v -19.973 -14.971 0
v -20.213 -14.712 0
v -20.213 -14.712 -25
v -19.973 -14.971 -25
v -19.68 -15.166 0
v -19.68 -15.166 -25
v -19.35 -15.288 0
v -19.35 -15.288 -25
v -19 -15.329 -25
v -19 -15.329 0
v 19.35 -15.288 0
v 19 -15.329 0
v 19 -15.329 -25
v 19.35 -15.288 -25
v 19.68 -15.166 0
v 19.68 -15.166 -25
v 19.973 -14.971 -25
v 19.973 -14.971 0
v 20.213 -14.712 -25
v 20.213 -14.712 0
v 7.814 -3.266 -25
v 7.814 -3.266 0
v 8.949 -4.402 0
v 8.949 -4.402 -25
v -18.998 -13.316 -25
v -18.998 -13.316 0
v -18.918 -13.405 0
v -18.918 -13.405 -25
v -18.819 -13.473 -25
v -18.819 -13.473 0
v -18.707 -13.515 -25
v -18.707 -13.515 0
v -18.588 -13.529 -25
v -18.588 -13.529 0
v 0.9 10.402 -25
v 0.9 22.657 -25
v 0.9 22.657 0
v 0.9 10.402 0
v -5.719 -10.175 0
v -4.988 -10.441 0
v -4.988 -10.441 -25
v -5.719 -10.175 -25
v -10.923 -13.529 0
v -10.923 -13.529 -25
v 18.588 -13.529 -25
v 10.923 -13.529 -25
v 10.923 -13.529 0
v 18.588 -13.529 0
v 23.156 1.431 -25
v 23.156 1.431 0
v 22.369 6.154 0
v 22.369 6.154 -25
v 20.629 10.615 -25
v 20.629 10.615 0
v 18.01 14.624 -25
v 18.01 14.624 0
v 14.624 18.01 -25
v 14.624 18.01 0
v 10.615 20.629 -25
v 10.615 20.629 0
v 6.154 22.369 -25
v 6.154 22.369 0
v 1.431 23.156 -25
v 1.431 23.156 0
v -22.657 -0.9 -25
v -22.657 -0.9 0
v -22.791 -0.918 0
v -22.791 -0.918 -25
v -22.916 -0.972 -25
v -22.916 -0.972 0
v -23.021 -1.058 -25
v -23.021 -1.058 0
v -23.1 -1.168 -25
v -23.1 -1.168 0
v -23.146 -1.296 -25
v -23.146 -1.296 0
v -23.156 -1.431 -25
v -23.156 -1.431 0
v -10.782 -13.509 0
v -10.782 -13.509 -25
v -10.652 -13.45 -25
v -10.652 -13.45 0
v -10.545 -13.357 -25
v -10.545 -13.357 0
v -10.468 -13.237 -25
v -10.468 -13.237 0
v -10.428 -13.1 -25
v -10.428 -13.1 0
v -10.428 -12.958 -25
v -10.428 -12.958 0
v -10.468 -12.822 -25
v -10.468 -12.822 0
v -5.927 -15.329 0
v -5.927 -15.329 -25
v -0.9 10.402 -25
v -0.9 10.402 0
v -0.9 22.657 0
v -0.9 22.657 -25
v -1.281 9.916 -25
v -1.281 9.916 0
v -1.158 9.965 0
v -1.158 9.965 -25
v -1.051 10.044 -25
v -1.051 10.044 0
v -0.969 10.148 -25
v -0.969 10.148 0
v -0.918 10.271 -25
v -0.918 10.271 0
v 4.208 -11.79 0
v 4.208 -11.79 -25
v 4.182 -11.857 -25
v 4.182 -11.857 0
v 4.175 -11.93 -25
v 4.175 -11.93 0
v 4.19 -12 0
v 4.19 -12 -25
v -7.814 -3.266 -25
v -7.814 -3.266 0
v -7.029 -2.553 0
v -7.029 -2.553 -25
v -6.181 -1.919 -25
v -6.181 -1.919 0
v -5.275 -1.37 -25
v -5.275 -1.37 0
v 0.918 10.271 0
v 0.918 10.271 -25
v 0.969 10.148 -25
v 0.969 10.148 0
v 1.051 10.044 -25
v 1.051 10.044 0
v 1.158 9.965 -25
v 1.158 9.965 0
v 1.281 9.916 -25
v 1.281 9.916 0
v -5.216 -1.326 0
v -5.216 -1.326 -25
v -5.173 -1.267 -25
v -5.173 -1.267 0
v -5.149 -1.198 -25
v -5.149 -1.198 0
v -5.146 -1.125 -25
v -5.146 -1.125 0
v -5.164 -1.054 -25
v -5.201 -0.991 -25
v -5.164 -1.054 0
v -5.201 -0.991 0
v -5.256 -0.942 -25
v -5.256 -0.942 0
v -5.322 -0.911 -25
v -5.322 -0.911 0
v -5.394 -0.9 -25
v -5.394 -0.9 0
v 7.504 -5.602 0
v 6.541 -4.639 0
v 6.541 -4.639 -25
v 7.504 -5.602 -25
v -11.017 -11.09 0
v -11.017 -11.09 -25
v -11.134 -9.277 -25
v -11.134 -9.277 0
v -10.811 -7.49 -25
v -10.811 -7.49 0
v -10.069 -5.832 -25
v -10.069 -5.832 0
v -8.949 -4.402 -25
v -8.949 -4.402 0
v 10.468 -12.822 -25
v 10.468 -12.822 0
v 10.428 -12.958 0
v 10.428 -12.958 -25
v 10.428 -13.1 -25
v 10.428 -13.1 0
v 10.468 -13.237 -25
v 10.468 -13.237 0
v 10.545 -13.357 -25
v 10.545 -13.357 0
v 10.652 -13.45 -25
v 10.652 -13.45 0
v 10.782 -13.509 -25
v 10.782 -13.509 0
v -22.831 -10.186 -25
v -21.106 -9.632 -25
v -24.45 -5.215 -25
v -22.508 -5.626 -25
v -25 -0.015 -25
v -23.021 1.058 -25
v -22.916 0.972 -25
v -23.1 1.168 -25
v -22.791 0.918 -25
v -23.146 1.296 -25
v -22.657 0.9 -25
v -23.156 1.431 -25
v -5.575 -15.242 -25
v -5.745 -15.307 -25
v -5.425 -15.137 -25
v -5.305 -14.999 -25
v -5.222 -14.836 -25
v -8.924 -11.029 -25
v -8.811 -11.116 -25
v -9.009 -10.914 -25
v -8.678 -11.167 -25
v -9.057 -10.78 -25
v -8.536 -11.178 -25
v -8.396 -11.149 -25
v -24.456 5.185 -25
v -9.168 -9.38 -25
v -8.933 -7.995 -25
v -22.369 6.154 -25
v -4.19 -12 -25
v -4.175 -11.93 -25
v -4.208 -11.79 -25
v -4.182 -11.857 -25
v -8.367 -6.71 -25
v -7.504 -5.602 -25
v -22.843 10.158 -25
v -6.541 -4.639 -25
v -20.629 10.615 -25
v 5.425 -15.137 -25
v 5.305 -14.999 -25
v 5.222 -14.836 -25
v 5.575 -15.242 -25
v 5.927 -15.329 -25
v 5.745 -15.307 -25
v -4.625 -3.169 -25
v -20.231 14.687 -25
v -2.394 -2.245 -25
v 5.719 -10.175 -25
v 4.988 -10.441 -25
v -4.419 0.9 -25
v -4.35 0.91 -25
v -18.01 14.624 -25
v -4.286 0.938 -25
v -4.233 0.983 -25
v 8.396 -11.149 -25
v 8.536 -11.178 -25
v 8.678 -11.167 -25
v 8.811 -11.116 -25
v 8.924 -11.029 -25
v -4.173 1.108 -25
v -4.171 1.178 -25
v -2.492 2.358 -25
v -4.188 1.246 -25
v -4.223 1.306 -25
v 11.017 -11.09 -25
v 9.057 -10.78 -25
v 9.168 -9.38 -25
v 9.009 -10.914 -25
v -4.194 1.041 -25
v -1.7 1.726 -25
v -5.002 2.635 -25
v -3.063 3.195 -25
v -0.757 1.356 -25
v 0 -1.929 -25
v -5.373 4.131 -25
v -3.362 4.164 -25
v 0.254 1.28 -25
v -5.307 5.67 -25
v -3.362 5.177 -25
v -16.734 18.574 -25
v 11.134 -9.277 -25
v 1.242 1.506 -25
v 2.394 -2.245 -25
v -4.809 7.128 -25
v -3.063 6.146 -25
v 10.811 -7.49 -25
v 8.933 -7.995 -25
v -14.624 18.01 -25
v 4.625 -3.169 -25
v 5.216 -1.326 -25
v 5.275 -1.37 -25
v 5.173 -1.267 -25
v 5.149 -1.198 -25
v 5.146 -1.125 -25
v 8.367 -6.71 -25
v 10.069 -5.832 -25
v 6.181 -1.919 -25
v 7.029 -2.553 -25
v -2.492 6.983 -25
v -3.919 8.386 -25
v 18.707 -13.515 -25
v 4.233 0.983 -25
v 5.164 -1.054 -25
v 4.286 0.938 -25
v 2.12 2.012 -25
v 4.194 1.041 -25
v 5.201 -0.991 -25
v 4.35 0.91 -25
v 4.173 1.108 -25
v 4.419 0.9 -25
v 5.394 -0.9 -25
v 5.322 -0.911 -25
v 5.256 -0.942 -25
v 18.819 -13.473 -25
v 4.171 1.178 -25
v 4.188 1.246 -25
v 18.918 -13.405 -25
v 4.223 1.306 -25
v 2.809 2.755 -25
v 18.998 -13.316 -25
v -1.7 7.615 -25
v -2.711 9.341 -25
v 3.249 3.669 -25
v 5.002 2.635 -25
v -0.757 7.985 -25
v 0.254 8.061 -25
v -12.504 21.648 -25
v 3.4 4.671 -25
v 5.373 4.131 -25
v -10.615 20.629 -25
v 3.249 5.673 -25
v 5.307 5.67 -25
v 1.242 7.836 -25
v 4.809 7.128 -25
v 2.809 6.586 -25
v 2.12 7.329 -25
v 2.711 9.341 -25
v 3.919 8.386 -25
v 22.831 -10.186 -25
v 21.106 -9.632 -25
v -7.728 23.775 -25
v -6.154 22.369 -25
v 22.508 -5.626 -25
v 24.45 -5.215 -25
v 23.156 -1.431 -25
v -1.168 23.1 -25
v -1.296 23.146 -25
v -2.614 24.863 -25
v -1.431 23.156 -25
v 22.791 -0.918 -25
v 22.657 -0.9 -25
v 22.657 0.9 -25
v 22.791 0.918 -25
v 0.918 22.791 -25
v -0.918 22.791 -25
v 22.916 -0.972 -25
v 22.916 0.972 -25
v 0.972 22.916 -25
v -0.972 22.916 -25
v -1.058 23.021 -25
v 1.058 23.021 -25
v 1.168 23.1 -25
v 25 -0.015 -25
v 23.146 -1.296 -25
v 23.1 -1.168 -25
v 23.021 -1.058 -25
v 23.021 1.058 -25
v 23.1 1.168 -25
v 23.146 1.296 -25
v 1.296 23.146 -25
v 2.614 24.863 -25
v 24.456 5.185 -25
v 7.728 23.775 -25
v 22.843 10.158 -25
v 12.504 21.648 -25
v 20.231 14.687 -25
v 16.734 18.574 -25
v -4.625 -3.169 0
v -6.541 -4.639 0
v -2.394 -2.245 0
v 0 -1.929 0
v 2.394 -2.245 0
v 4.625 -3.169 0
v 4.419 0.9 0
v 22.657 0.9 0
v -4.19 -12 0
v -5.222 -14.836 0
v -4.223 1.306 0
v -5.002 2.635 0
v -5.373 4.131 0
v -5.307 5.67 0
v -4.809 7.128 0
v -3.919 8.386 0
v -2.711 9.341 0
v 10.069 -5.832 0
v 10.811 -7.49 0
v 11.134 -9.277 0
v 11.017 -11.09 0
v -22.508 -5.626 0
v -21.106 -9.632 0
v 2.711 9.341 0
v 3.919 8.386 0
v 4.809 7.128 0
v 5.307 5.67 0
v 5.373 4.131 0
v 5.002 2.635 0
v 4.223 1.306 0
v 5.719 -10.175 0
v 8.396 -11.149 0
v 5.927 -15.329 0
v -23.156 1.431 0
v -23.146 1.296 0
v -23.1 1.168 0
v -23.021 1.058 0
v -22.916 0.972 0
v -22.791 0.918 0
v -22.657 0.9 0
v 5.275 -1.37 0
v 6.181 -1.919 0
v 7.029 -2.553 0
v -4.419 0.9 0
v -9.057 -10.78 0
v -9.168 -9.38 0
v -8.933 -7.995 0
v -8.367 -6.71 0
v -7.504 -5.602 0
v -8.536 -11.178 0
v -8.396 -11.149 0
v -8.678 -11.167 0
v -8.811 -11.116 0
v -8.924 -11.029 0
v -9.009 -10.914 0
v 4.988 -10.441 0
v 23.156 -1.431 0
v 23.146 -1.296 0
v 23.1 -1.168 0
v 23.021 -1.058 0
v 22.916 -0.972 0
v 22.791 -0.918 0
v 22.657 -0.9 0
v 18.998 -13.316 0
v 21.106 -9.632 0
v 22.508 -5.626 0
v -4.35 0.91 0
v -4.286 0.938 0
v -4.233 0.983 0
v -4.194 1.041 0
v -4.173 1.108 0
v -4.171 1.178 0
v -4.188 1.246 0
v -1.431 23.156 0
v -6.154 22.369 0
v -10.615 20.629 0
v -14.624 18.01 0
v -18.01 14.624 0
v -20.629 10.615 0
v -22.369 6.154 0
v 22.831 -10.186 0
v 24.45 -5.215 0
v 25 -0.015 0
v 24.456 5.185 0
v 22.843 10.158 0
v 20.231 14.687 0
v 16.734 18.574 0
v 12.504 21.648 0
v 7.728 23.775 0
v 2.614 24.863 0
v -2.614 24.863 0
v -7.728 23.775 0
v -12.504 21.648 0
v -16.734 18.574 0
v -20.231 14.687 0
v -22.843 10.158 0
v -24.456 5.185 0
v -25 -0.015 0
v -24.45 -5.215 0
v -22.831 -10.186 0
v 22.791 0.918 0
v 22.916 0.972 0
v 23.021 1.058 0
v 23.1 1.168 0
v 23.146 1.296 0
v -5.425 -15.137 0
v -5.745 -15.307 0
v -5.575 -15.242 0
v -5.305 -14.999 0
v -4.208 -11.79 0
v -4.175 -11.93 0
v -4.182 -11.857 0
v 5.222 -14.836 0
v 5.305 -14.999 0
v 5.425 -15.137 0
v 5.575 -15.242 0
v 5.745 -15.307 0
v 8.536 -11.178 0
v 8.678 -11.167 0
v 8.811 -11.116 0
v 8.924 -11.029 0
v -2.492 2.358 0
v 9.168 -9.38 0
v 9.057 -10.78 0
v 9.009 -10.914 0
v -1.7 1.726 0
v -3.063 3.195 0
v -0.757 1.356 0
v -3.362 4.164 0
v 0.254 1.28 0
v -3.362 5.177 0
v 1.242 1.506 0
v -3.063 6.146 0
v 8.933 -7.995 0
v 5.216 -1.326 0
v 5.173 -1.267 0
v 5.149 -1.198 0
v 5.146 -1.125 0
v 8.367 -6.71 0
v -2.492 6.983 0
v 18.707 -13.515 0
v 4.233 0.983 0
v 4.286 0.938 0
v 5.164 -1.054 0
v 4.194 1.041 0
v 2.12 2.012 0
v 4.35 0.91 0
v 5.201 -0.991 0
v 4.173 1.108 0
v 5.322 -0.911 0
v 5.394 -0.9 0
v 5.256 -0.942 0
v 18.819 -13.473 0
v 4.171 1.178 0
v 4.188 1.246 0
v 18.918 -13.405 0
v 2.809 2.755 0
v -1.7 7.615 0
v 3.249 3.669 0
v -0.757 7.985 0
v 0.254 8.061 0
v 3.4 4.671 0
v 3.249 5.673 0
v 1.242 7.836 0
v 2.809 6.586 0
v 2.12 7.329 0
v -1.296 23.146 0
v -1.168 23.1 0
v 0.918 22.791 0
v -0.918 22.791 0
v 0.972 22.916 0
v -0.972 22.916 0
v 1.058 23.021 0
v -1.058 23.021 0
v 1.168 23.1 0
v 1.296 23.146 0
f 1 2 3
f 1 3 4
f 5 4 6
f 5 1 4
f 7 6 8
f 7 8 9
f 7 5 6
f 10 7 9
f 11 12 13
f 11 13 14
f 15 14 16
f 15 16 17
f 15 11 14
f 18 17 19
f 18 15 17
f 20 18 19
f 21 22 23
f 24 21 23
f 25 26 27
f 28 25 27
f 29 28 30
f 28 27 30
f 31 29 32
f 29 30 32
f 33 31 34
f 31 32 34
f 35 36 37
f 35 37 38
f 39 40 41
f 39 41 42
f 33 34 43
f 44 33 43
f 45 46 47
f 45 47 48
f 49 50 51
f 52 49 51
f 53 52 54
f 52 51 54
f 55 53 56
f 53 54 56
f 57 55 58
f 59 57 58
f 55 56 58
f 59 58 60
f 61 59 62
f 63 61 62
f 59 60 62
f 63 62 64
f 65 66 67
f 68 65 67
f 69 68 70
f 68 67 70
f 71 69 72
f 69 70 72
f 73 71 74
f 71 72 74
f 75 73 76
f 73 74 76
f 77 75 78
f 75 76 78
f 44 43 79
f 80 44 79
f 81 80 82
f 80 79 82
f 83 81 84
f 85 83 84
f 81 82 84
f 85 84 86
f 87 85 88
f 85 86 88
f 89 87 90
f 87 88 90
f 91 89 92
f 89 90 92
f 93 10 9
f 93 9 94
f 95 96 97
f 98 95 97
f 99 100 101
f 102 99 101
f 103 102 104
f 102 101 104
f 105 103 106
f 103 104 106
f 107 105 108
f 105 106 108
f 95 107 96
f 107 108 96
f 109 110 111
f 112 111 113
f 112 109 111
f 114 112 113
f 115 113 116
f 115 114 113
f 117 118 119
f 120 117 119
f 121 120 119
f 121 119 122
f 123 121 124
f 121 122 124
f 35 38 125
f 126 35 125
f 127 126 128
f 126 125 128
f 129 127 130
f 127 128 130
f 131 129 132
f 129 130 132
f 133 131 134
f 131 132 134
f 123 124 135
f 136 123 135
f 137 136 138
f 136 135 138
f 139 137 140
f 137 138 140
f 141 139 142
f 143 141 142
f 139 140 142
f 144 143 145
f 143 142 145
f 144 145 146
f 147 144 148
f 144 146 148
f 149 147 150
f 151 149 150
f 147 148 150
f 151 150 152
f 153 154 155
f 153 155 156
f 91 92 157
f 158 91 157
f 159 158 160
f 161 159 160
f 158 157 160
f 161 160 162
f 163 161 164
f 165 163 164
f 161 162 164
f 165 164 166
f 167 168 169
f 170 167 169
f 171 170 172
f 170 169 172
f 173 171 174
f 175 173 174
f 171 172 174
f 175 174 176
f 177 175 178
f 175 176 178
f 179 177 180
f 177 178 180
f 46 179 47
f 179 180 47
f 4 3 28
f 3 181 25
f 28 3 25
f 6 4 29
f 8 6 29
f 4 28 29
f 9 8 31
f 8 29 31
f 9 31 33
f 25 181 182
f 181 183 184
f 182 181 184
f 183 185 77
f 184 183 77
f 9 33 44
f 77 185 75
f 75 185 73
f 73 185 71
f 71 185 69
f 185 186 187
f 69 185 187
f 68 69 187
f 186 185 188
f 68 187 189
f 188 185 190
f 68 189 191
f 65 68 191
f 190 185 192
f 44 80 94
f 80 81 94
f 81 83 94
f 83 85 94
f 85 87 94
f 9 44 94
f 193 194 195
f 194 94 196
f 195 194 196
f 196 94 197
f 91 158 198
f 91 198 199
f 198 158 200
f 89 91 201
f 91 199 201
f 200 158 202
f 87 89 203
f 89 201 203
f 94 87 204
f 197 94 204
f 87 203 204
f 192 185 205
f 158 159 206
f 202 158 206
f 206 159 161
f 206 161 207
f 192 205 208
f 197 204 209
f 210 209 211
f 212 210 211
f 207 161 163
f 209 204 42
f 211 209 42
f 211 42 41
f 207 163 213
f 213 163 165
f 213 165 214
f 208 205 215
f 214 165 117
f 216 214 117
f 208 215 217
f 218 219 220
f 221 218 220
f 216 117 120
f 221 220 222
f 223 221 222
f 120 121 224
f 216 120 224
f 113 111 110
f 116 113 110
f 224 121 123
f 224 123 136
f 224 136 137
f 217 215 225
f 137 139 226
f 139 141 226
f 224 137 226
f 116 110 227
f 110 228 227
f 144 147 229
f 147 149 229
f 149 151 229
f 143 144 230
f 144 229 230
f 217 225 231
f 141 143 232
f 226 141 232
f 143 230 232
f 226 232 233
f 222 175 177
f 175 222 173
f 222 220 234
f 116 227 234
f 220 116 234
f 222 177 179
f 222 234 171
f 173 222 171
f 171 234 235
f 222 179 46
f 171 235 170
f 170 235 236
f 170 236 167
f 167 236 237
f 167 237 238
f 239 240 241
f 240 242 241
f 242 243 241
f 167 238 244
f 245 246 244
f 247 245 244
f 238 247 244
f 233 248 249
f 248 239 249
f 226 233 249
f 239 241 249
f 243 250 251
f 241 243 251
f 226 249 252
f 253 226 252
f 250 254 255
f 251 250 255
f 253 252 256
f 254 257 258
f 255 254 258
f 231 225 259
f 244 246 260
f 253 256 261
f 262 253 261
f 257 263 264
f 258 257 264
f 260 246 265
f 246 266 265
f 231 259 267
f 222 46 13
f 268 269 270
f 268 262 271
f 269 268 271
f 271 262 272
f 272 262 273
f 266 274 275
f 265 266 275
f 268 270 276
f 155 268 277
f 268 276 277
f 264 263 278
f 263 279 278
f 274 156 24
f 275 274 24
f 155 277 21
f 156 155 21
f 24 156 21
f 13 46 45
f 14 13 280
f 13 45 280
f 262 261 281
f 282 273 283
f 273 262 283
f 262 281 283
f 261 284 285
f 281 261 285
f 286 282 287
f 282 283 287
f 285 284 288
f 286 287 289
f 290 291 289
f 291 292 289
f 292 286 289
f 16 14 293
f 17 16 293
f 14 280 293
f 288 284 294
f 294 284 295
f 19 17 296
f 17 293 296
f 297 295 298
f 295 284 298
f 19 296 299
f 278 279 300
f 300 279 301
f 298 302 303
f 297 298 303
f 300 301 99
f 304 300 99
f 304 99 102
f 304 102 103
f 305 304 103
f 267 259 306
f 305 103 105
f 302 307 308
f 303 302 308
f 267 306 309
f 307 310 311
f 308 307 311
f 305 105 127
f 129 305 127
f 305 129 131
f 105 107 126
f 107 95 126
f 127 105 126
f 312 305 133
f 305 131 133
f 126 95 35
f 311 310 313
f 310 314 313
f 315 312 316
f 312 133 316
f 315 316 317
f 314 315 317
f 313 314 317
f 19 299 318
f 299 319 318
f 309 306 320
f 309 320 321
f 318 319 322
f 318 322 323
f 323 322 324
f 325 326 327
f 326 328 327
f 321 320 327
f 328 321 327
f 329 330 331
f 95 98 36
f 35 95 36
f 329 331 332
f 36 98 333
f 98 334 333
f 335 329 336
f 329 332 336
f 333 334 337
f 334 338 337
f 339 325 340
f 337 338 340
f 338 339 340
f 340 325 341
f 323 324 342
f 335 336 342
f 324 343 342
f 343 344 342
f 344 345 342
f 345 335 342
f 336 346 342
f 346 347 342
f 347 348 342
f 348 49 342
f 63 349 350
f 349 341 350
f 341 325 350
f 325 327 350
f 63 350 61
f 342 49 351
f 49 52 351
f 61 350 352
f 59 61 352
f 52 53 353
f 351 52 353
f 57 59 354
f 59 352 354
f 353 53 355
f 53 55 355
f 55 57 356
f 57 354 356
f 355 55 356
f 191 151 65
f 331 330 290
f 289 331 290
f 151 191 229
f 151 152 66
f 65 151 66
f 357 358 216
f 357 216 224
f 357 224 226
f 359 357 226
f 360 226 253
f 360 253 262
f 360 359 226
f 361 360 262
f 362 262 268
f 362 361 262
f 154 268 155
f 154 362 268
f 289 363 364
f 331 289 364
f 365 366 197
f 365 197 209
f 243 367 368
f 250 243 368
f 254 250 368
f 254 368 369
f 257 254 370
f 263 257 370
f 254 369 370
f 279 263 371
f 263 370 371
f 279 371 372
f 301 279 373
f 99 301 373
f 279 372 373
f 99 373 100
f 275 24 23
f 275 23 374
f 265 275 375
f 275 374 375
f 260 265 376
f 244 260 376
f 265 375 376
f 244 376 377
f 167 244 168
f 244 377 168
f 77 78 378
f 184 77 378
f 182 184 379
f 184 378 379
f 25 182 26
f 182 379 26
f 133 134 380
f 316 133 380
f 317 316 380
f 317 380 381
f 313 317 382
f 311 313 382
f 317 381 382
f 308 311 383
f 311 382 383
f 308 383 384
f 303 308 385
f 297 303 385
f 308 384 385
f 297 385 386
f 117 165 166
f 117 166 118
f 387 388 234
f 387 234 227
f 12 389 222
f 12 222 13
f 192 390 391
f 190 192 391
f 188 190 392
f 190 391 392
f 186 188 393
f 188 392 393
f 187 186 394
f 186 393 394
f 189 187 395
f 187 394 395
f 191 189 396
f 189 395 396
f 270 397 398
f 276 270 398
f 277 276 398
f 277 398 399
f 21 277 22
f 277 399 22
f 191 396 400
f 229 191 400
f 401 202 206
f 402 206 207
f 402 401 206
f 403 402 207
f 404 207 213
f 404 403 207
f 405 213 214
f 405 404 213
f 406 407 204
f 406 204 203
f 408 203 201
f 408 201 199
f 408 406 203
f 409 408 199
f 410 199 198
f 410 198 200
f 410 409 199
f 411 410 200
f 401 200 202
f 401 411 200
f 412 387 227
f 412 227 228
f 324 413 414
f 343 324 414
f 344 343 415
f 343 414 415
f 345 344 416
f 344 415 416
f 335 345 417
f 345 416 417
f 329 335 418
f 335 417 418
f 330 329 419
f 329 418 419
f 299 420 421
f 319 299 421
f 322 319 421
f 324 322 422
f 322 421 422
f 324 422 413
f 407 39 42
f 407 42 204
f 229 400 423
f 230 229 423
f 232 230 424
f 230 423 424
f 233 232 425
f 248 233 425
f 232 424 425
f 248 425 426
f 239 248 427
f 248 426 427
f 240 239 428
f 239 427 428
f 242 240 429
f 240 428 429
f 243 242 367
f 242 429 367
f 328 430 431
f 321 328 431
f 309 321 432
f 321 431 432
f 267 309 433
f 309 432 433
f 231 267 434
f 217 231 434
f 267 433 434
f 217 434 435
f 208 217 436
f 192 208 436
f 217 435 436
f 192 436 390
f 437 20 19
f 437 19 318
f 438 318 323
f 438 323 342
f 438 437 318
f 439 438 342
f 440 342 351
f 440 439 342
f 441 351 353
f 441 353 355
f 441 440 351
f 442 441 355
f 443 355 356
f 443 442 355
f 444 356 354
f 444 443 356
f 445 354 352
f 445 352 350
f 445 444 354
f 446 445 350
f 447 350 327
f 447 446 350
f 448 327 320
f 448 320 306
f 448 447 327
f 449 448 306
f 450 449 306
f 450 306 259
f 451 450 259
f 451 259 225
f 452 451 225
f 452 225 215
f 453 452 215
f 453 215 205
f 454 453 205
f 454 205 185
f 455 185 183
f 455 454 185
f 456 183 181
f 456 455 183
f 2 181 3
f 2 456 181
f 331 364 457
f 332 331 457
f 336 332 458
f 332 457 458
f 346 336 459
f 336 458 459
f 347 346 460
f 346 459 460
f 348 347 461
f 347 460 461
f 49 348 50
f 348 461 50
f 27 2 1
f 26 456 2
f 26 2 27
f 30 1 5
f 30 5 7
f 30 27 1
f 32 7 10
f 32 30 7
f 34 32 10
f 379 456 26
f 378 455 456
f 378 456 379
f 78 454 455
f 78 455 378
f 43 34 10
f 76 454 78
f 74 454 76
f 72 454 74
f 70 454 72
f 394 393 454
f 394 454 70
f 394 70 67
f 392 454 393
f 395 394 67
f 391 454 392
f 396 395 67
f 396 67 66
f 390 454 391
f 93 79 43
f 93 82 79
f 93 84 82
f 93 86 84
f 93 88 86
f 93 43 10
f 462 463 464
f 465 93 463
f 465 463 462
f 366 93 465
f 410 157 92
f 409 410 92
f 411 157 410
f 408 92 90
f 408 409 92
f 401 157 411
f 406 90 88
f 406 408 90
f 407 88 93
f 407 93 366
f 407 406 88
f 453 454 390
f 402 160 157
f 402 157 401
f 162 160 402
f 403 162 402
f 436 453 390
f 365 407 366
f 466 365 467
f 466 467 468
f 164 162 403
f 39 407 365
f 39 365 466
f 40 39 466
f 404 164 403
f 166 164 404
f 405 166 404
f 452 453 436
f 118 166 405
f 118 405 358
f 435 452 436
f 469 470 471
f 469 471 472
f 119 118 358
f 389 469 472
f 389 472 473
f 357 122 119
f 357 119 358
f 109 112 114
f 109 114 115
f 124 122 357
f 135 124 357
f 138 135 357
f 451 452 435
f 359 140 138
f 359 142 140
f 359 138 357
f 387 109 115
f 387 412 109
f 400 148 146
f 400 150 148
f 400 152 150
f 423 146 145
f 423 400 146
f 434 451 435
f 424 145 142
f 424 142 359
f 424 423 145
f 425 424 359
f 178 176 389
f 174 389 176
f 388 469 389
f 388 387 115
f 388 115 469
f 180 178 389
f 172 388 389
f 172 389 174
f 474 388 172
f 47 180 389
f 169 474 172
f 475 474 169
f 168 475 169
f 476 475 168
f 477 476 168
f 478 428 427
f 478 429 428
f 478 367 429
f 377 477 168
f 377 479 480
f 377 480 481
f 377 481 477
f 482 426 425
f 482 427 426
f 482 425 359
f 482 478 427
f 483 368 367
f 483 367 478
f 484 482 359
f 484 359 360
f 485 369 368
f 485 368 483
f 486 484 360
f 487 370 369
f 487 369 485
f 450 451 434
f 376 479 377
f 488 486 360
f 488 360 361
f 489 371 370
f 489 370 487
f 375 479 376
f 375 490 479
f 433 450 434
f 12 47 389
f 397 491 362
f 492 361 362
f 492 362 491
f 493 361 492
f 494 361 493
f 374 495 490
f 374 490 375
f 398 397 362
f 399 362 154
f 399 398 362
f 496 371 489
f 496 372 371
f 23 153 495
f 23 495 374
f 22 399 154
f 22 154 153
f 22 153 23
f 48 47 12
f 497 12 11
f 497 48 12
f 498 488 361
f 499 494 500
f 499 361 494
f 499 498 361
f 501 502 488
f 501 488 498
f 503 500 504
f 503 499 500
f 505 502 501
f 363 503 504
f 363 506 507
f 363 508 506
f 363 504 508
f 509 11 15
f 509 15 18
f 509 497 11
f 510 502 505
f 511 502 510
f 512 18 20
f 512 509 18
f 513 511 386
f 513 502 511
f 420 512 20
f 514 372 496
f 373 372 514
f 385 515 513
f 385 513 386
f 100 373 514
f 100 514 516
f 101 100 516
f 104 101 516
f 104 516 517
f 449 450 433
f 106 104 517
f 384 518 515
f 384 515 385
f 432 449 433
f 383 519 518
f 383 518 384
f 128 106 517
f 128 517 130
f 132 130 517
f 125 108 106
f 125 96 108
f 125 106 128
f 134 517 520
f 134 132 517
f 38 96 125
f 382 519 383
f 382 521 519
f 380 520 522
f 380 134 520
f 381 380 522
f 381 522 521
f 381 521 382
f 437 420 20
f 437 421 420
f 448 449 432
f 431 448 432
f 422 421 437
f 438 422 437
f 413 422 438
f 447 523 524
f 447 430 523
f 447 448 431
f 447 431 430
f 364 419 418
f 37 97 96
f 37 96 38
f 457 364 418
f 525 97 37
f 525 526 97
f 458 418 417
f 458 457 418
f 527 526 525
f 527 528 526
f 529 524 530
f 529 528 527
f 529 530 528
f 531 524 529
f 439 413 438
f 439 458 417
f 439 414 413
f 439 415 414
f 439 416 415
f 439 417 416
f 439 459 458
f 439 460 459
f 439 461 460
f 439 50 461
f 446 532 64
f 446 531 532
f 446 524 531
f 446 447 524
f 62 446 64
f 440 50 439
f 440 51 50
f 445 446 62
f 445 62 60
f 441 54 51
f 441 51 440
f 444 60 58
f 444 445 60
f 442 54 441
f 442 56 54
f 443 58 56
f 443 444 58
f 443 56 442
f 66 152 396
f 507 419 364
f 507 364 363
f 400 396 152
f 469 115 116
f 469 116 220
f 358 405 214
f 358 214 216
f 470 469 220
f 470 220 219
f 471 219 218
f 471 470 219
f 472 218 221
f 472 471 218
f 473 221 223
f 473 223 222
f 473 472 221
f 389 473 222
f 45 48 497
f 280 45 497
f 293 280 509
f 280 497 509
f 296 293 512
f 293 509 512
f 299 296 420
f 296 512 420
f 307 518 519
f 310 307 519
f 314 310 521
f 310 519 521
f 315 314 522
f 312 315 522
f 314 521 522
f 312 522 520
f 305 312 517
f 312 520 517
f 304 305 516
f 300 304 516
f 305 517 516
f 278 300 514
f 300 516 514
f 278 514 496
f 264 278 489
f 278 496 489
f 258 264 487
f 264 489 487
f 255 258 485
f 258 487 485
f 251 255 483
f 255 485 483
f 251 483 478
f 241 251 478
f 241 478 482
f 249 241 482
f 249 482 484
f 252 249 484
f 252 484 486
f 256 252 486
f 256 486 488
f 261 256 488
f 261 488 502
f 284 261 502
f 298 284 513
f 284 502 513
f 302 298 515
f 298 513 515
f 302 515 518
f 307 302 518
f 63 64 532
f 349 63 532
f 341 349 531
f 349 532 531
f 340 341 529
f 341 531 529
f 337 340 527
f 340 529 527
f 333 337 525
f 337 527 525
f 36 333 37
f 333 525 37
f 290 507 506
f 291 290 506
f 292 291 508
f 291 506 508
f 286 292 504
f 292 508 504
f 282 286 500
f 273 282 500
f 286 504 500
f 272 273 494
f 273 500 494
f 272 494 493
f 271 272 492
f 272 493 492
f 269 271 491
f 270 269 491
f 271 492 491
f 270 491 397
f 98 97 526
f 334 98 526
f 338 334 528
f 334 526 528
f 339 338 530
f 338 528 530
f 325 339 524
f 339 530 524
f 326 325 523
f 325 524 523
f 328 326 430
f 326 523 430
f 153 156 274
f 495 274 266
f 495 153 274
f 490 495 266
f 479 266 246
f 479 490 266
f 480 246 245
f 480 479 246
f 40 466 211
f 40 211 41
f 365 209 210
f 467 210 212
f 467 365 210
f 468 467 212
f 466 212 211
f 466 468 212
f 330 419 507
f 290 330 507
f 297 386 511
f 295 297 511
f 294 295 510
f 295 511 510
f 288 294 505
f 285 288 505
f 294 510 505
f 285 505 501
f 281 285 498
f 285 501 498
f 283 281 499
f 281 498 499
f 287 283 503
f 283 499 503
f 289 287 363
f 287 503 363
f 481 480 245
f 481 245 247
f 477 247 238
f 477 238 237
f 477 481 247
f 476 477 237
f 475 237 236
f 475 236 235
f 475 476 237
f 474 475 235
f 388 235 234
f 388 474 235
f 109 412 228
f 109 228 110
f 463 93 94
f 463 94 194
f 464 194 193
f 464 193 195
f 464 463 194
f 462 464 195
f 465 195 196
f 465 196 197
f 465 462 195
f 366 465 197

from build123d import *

# Parameters (mm, degrees)
SK_MAIN_EXTRUSION_R  = 3.4
MAIN_EXTRUSION_DEPTH = 25


with BuildPart() as part:
    # Sk Main Extrusion → Main Extrusion (new body)
    with BuildSketch(Plane.XY):
        with BuildLine():
            Line((5.926823816, -15.329316686), (19, -15.329316686))
            ThreePointArc((19, -15.329316686), (19.68041035, -15.166119497), (20.212765957, -14.712039028))
            ThreePointArc((20.212765957, -14.712039028), (0, 25), (-20.212765957, -14.712039028))
            ThreePointArc((-20.212765957, -14.712039028), (-19.68041035, -15.166119497), (-19, -15.329316686))
            Line((-19, -15.329316686), (-5.926823816, -15.329316686))
            ThreePointArc((-5.926823816, -15.329316686), (-5.496641489, -15.193680719), (-5.222054351, -14.835831793))
            Line((-5.222054351, -14.835831793), (-4.190076845, -12.000496898))
            ThreePointArc((-4.190076845, -12.000496898), (-4.175951325, -11.893202927), (-4.208493649, -11.789991862))
            Line((-4.208493649, -11.789991862), (-4.987558066, -10.44061271))
            Line((-4.987558066, -10.44061271), (-5.718509166, -10.174568267))
            Line((-5.718509166, -10.174568267), (-8.396186179, -11.149162996))
            ThreePointArc((-8.396186179, -11.149162996), (-8.811074612, -11.115806485), (-9.056960151, -10.779971153))
            ThreePointArc((-9.056960151, -10.779971153), (-8.933433013, -7.995199058), (-7.504160339, -5.602001573))
            Line((-7.504160339, -5.602001573), (-6.540737726, -4.63857896))
            ThreePointArc((-6.540737726, -4.63857896), (0, -1.929316686), (6.540737726, -4.63857896))
            Line((6.540737726, -4.63857896), (7.504160339, -5.602001573))
            ThreePointArc((7.504160339, -5.602001573), (8.933433013, -7.995199058), (9.056960151, -10.779971153))
            ThreePointArc((9.056960151, -10.779971153), (8.811074612, -11.115806485), (8.396186179, -11.149162996))
            Line((8.396186179, -11.149162996), (5.718509166, -10.174568267))
            Line((5.718509166, -10.174568267), (4.987558066, -10.44061271))
            Line((4.987558066, -10.44061271), (4.208493649, -11.789991862))
            ThreePointArc((4.208493649, -11.789991862), (4.175951325, -11.893202927), (4.190076845, -12.000496898))
            Line((4.190076845, -12.000496898), (5.222054351, -14.835831793))
            ThreePointArc((5.222054351, -14.835831793), (5.496641489, -15.193680719), (5.926823816, -15.329316686))
        make_face()
        with Locations((0, 4.670683314)):
            Circle(SK_MAIN_EXTRUSION_R, mode=Mode.SUBTRACT)
        with BuildLine():
            Line((4.418969224, 0.9), (22.656787063, 0.9))
            ThreePointArc((22.656787063, 0.9), (23.021079872, 1.05752263), (23.155835236, 1.430837004))
            ThreePointArc((23.155835236, 1.430837004), (16.404877324, 16.404877324), (1.430837004, 23.155835236))
            ThreePointArc((1.430837004, 23.155835236), (1.05752263, 23.021079872), (0.9, 22.656787063))
            Line((0.9, 22.656787063), (0.9, 10.402175266))
            ThreePointArc((0.9, 10.402175266), (1.006730351, 10.093405153), (1.281355932, 9.916455609))
            ThreePointArc((1.281355932, 9.916455609), (5.109952698, 6.416645349), (4.223439612, 1.305782448))
            ThreePointArc((4.223439612, 1.305782448), (4.193751982, 1.041477219), (4.418969224, 0.9))
        make_face(mode=Mode.SUBTRACT)
        with BuildLine():
            Line((-22.656787063, 0.9), (-4.418969224, 0.9))
            ThreePointArc((-4.418969224, 0.9), (-4.193751982, 1.041477219), (-4.223439612, 1.305782448))
            ThreePointArc((-4.223439612, 1.305782448), (-5.109952698, 6.416645349), (-1.281355932, 9.916455609))
            ThreePointArc((-1.281355932, 9.916455609), (-1.006730351, 10.093405153), (-0.9, 10.402175266))
            Line((-0.9, 10.402175266), (-0.9, 22.656787063))
            ThreePointArc((-0.9, 22.656787063), (-1.05752263, 23.021079872), (-1.430837004, 23.155835236))
            ThreePointArc((-1.430837004, 23.155835236), (-16.404877324, 16.404877324), (-23.155835236, 1.430837004))
            ThreePointArc((-23.155835236, 1.430837004), (-23.021079872, 1.05752263), (-22.656787063, 0.9))
        make_face(mode=Mode.SUBTRACT)
        with BuildLine():
            Line((-18.588354061, -13.529316686), (-10.922546302, -13.529316686))
            ThreePointArc((-10.922546302, -13.529316686), (-10.501898529, -13.299604404), (-10.467762595, -12.821538488))
            ThreePointArc((-10.467762595, -12.821538488), (-11.026944485, -8.37379017), (-8.949307842, -4.401564664))
            Line((-8.949307842, -4.401564664), (-7.813529932, -3.265786754))
            ThreePointArc((-7.813529932, -3.265786754), (-6.612567589, -2.226269195), (-5.274974996, -1.369675148))
            ThreePointArc((-5.274974996, -1.369675148), (-5.152018108, -1.088432098), (-5.394318321, -0.9))
            Line((-5.394318321, -0.9), (-22.656787063, -0.9))
            ThreePointArc((-22.656787063, -0.9), (-23.021079872, -1.05752263), (-23.155835236, -1.430837004))
            ThreePointArc((-23.155835236, -1.430837004), (-21.898586855, -7.661063488), (-18.997789172, -13.31630604))
            ThreePointArc((-18.997789172, -13.31630604), (-18.819119443, -13.472878788), (-18.588354061, -13.529316686))
        make_face(mode=Mode.SUBTRACT)
        with BuildLine():
            Line((7.813529932, -3.265786754), (8.949307842, -4.401564664))
            ThreePointArc((8.949307842, -4.401564664), (11.026944485, -8.37379017), (10.467762595, -12.821538488))
            ThreePointArc((10.467762595, -12.821538488), (10.501898529, -13.299604404), (10.922546302, -13.529316686))
            Line((10.922546302, -13.529316686), (18.588354061, -13.529316686))
            ThreePointArc((18.588354061, -13.529316686), (18.819119443, -13.472878788), (18.997789172, -13.31630604))
            ThreePointArc((18.997789172, -13.31630604), (21.898586855, -7.661063488), (23.155835236, -1.430837004))
            ThreePointArc((23.155835236, -1.430837004), (23.021079872, -1.05752263), (22.656787063, -0.9))
            Line((22.656787063, -0.9), (5.394318321, -0.9))
            ThreePointArc((5.394318321, -0.9), (5.152018108, -1.088432098), (5.274974996, -1.369675148))
            ThreePointArc((5.274974996, -1.369675148), (6.612567589, -2.226269195), (7.813529932, -3.265786754))
        make_face(mode=Mode.SUBTRACT)
    extrude(amount=-MAIN_EXTRUSION_DEPTH)


solid = part.part
